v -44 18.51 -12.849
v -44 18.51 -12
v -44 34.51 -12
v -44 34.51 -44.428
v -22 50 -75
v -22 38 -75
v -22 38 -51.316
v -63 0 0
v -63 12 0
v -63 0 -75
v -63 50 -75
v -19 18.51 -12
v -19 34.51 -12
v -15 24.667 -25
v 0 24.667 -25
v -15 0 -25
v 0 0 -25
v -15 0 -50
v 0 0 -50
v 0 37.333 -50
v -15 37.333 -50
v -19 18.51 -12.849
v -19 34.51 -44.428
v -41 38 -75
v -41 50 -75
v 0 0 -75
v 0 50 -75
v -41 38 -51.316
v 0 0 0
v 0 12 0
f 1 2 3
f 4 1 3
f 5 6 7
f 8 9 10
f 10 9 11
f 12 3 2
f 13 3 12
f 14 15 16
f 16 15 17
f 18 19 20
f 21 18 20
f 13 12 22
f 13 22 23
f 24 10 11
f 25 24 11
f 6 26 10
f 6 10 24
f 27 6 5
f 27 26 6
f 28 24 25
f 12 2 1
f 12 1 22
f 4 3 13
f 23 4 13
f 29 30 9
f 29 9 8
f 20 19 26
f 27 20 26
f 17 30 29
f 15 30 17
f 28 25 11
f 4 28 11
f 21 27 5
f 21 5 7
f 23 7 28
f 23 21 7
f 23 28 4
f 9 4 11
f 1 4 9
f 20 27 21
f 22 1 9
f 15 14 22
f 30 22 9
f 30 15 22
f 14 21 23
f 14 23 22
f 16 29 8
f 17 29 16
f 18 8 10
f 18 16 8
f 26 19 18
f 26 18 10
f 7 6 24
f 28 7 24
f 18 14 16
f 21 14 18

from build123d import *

# Parameters (mm, degrees)
BOSS_EXTRUDE1_DEPTH = 63
CUT_EXTRUDE1_DEPTH  = 15
CUT_EXTRUDE2_REACH  = 111.973
SKETCH3_W           = 19
SKETCH3_H           = 12
BOSS_EXTRUDE2_REACH = 123.973
BOSS_EXTRUDE2_START = -12
SKETCH4_W           = 25
SKETCH4_H           = 16


with BuildPart() as part:
    # Sketch1 → Boss-Extrude1 (new body)
    with BuildSketch(Plane(origin=(0, 0, 0), x_dir=(0, 0, -1), z_dir=(1, 0, 0))):
        Polygon((0, 0), (75, 0), (75, 50), (0, 12), align=None)
    extrude(amount=-BOSS_EXTRUDE1_DEPTH)

    # Sketch2 → Cut-Extrude1 (cut)
    with BuildSketch(Plane(origin=(0, 0, 0), x_dir=(0, 0, -1), z_dir=(1, 0, 0))):
        Polygon((25, 24.666666667), (25, 0), (50, 0), (50, 37.333333333), align=None)
    extrude(amount=-CUT_EXTRUDE1_DEPTH, mode=Mode.SUBTRACT)

    # Sketch3 → Cut-Extrude2 (cut, up to next)
    with BuildSketch(Plane(origin=(0, 0, -75), x_dir=(-1, 0, 0), z_dir=(0, 0, -1)), mode=Mode.PRIVATE) as cut_extrude2_sk1:
        with Locations((31.5, 44)):
            Rectangle(SKETCH3_W, SKETCH3_H)
    cut_extrude2_tool1 = extrude(cut_extrude2_sk1.sketch, amount=-CUT_EXTRUDE2_REACH, mode=Mode.PRIVATE) & part.part
    add(cut_extrude2_tool1.solids().sort_by_distance((-31.5, 44, -75))[0], mode=Mode.SUBTRACT)

    # Boss-Extrude2: up to this plane
    boss_extrude2_end = Plane(origin=(-63, 50, -75), z_dir=(0, 0.8920357760302685, 0.4519647931886695))
    # Sketch4 → Boss-Extrude2 (add, up to the surface)
    with BuildSketch(Plane.XY.offset(BOSS_EXTRUDE2_START), mode=Mode.PRIVATE) as boss_extrude2_sk1:
        with Locations((-31.5, 26.510404023)):
            Rectangle(SKETCH4_W, SKETCH4_H)
    boss_extrude2_tool1 = split(extrude(boss_extrude2_sk1.sketch, amount=-BOSS_EXTRUDE2_REACH, mode=Mode.PRIVATE), bisect_by=boss_extrude2_end, keep=Keep.BOTH, mode=Mode.PRIVATE)
    add(boss_extrude2_tool1.solids().sort_by_distance((-31.5, 26.510404, -12))[0])


solid = part.part
